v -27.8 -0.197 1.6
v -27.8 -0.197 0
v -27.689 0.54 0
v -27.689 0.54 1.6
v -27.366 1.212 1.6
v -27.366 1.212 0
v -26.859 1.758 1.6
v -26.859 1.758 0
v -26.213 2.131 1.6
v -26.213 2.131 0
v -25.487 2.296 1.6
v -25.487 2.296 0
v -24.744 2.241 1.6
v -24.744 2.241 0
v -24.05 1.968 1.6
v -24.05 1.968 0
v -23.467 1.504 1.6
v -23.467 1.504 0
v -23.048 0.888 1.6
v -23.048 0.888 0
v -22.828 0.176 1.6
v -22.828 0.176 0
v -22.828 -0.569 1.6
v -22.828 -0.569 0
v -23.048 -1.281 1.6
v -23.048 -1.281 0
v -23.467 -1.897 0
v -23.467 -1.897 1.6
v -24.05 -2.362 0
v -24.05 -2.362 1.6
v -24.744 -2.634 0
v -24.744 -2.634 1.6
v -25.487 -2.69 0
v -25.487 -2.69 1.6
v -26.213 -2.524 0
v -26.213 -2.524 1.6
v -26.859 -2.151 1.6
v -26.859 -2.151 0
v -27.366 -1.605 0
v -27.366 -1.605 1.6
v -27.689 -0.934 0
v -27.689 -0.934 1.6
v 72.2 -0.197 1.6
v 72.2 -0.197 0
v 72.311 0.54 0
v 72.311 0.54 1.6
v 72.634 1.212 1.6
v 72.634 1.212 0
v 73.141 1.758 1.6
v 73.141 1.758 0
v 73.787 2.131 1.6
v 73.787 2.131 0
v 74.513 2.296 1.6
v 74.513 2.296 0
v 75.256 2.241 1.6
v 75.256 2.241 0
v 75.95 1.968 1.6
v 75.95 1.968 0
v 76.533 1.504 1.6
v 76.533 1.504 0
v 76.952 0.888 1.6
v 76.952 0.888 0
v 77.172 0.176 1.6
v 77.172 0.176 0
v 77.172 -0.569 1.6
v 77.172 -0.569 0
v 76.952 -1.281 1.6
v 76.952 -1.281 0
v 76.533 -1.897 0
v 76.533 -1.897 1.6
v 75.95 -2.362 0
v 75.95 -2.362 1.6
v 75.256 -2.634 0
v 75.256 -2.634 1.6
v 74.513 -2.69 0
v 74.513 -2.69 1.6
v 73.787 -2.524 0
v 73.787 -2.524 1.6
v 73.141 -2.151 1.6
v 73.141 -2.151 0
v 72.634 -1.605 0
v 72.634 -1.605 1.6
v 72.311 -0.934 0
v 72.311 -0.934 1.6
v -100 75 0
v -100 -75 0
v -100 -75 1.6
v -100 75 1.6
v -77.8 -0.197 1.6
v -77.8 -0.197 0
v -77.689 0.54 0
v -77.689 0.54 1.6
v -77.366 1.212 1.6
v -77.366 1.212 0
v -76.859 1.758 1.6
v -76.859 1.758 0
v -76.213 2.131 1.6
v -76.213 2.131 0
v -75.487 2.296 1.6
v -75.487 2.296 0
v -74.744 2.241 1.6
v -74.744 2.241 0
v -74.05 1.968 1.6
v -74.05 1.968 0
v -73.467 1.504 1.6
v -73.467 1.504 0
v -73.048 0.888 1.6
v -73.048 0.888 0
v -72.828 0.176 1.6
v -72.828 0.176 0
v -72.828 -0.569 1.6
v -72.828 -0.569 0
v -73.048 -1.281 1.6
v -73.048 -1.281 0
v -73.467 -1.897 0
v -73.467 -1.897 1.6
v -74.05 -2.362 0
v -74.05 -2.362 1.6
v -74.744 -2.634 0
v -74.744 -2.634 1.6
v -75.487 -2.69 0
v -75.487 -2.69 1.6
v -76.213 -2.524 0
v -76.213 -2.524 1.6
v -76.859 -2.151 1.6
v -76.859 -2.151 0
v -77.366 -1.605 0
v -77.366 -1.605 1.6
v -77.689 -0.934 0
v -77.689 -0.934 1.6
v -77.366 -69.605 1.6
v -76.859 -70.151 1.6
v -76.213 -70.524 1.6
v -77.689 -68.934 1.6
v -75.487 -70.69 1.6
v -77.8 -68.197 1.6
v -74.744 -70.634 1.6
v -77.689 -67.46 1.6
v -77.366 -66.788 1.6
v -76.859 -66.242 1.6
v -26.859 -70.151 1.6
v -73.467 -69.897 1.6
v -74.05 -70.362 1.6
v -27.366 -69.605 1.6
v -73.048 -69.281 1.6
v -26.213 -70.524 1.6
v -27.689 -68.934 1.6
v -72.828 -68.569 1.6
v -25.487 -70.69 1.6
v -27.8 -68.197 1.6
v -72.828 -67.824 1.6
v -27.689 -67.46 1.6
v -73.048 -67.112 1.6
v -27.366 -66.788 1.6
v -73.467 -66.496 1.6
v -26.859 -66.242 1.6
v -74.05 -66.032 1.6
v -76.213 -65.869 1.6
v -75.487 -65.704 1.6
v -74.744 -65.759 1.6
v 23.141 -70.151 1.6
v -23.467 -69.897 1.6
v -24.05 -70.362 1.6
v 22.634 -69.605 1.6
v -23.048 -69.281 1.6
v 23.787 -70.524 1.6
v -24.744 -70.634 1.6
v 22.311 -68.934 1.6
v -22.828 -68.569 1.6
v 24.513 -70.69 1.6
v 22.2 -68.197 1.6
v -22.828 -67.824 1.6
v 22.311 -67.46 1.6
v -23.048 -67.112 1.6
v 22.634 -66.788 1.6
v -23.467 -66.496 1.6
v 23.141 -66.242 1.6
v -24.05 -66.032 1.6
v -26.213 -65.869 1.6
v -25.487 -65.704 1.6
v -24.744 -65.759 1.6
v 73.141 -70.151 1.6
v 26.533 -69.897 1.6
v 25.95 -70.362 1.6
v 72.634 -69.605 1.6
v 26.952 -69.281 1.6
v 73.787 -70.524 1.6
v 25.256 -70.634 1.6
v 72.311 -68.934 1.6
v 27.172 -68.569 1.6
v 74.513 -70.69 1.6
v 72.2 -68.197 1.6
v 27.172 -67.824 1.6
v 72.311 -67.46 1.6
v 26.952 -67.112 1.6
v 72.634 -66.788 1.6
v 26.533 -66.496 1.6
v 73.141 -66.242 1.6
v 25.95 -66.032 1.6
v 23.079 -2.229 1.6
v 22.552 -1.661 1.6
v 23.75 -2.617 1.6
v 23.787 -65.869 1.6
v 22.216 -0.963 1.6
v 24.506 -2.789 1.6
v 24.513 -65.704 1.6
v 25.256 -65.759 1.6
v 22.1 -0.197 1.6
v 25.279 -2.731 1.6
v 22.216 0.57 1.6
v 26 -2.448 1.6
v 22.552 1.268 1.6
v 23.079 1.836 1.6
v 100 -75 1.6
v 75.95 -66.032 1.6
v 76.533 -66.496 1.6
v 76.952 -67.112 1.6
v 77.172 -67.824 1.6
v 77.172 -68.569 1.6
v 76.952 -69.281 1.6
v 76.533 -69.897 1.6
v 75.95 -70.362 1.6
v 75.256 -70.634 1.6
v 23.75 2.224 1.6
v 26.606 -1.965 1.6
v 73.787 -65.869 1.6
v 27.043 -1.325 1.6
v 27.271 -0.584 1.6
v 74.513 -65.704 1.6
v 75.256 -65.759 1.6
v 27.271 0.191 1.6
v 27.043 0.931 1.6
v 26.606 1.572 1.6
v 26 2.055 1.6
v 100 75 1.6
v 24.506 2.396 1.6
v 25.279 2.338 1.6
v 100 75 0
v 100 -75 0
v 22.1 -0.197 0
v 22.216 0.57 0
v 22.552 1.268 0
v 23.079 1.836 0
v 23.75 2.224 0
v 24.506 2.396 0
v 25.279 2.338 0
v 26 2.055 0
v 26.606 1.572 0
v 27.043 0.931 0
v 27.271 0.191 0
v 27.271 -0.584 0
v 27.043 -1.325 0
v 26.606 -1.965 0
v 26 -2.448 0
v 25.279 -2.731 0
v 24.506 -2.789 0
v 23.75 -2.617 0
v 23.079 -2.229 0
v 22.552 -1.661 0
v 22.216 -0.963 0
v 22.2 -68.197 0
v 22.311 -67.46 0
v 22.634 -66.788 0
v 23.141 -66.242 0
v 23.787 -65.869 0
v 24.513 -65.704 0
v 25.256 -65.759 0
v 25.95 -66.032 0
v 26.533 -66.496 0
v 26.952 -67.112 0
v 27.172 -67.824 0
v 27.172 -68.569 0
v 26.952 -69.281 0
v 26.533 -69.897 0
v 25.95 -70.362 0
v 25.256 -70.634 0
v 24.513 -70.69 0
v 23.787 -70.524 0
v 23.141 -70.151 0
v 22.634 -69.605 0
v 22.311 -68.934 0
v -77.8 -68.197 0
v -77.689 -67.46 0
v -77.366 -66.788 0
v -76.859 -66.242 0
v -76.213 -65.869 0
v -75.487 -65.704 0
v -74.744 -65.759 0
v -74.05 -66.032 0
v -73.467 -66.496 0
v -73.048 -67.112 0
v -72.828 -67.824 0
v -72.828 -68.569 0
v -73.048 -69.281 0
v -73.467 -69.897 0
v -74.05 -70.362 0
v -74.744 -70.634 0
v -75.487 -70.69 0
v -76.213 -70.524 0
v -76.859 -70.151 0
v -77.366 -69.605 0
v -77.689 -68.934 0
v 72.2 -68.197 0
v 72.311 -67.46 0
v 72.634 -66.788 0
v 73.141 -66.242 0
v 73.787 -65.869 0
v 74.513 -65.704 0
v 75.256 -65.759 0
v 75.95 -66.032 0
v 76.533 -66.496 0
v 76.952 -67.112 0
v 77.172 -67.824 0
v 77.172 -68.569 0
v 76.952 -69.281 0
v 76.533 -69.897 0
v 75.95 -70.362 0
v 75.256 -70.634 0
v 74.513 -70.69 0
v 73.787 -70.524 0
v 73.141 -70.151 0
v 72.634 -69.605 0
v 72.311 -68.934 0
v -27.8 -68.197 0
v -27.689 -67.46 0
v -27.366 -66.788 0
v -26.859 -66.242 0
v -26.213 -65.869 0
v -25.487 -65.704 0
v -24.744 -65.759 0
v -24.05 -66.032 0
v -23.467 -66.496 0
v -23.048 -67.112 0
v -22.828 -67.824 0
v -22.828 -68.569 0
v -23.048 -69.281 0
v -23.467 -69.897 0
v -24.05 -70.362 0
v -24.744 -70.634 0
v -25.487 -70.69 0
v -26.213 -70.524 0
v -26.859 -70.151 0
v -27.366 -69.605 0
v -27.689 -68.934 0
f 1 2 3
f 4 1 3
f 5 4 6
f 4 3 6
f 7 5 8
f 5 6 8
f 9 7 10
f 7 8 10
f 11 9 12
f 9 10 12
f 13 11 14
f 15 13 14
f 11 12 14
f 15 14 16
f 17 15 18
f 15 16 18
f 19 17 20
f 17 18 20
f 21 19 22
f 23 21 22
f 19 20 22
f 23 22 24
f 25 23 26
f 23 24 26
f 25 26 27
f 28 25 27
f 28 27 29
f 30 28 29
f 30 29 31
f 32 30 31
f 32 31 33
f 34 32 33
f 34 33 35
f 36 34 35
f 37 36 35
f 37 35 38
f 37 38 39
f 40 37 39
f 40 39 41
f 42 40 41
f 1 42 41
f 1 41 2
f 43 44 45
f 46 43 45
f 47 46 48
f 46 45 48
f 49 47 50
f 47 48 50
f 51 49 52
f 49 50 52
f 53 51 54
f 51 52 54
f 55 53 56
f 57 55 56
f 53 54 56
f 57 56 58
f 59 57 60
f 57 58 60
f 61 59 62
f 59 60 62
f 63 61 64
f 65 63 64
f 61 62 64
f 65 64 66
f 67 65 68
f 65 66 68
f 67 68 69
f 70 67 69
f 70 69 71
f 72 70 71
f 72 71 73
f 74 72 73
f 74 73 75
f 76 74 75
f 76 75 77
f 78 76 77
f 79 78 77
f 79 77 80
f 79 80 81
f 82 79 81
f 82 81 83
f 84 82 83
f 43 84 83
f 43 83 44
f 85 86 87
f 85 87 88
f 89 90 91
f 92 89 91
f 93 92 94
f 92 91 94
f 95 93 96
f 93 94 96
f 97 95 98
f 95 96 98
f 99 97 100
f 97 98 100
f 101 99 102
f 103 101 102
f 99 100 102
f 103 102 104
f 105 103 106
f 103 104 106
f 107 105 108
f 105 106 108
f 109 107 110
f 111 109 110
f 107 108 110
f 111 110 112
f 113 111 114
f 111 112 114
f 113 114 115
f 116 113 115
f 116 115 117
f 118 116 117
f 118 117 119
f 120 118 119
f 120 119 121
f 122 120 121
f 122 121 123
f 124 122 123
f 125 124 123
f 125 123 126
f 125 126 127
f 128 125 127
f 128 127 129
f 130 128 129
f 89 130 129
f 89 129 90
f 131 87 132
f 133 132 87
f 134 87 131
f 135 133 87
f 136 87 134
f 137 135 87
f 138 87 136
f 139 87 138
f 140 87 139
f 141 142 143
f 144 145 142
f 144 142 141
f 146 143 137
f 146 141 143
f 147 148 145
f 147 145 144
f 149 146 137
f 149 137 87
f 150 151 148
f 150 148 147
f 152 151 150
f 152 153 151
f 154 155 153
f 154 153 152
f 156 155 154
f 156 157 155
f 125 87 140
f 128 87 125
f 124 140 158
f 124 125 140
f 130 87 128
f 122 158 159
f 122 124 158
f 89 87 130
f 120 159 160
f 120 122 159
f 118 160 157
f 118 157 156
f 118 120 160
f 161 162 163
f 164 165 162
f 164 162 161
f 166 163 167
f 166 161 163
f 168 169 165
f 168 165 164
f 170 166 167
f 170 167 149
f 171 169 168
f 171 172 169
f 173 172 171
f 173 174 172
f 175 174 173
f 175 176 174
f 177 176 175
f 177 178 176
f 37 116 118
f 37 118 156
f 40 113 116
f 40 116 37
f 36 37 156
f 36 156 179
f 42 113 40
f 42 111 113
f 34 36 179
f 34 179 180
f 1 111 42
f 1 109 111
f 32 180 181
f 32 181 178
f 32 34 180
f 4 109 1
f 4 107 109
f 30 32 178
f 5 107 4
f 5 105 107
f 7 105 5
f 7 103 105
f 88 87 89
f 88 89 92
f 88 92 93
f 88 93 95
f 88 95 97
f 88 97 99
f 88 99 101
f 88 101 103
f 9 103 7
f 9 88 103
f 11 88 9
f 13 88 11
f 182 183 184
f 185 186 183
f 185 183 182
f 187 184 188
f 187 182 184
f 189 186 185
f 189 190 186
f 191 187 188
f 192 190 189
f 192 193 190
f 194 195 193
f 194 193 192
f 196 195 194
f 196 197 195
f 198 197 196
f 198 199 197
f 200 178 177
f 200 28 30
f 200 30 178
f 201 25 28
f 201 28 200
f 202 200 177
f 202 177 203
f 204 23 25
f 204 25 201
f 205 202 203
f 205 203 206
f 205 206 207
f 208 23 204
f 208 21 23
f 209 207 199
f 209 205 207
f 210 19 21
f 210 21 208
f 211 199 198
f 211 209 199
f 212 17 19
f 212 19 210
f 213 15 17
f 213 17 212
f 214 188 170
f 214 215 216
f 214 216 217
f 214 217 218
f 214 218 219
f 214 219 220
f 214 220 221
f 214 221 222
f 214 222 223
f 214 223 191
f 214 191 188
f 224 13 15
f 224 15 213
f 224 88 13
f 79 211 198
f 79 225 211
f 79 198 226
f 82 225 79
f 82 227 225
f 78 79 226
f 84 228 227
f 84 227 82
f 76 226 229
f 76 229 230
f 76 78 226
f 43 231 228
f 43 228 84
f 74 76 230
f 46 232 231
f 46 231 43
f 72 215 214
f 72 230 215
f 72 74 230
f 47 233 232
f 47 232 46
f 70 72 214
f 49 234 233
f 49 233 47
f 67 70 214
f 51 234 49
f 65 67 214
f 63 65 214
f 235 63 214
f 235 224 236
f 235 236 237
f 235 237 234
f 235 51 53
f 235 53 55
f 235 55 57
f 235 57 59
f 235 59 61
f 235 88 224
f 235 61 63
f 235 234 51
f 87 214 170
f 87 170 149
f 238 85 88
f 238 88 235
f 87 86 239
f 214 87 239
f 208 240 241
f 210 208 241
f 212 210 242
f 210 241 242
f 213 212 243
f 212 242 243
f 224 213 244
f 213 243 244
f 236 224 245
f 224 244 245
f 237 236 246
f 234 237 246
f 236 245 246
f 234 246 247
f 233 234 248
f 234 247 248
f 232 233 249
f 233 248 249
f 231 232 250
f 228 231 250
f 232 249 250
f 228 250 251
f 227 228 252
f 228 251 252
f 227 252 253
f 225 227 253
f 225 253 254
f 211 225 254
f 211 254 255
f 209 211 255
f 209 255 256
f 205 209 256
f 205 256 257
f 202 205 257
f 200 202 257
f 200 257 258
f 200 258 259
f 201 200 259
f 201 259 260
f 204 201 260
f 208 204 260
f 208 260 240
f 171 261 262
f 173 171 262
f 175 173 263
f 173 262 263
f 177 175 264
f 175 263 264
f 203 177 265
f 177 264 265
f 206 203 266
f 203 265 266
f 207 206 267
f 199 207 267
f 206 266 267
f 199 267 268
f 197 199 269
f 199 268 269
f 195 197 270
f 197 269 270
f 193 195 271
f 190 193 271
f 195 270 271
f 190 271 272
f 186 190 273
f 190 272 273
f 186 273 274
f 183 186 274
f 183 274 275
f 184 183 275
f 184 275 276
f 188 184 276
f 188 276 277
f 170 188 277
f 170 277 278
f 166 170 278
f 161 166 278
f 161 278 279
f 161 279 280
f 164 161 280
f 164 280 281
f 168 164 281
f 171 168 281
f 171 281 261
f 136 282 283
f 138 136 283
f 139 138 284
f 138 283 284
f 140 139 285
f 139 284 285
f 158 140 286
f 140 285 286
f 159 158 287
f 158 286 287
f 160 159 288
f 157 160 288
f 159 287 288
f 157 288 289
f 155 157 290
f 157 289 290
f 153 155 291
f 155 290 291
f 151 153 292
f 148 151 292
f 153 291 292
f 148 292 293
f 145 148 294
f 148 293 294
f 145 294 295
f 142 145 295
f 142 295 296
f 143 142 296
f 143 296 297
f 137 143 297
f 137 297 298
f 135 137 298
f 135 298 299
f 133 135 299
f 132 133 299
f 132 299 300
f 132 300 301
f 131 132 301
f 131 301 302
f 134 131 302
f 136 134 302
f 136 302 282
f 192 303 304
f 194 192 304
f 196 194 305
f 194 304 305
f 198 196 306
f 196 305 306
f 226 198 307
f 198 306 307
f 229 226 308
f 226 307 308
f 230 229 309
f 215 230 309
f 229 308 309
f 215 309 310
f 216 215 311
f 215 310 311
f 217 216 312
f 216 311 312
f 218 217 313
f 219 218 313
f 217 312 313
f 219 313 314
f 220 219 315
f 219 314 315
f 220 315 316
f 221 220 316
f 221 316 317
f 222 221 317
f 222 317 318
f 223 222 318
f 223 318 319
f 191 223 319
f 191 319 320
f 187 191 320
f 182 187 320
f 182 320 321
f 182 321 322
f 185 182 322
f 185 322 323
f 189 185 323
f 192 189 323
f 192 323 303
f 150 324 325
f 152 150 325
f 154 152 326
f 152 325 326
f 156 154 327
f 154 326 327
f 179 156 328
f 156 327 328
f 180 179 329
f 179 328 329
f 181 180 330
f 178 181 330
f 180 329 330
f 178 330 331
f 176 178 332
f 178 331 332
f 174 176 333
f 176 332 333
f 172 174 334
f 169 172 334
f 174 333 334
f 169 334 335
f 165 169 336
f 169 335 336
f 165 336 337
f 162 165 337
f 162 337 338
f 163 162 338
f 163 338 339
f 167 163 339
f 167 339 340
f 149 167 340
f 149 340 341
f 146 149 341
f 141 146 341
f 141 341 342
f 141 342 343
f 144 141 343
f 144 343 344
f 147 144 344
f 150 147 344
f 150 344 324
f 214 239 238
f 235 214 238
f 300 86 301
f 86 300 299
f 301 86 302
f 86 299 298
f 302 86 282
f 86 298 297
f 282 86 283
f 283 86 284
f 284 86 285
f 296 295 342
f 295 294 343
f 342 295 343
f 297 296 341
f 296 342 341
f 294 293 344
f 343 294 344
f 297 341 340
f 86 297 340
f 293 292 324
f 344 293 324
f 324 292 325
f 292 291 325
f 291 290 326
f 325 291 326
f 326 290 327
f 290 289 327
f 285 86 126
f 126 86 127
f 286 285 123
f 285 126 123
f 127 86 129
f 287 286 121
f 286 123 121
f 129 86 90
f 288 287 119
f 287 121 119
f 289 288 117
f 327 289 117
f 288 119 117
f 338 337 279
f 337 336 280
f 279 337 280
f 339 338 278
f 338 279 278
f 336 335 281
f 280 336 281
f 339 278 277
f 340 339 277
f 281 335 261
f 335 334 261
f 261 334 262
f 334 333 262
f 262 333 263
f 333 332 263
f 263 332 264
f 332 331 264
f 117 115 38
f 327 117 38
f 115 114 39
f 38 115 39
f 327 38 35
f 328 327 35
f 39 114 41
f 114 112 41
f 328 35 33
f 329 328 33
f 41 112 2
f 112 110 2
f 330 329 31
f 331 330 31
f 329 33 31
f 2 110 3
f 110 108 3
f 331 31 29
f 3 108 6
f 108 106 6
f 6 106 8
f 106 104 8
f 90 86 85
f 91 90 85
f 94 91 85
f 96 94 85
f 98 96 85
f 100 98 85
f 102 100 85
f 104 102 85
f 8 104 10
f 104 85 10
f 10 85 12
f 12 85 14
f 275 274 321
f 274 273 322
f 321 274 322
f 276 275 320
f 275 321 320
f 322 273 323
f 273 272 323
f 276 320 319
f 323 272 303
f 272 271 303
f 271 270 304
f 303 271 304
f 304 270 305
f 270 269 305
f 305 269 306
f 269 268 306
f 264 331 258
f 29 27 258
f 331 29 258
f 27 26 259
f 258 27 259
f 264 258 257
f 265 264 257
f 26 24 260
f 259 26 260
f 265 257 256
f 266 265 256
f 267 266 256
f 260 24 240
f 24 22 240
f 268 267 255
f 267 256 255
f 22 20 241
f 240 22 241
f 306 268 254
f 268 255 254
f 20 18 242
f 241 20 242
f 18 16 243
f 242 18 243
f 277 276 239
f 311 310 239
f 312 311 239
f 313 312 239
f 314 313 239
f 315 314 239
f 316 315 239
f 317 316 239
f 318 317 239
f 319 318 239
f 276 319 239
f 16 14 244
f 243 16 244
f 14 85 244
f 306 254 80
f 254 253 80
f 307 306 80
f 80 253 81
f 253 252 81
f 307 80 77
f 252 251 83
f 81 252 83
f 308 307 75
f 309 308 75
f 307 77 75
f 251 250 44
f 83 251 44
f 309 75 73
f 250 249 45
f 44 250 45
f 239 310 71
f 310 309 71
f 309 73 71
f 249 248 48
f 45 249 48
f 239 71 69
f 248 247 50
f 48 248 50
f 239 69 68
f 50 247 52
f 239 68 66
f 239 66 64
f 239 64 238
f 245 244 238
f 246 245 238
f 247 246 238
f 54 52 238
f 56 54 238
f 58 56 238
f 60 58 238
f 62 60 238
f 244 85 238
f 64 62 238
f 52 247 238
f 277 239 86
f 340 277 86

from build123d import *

# Parameters (mm, degrees)
ESQUISSE1_W             = 200
ESQUISSE1_H             = 150
BOSS_EXTRU_1_DEPTH      = 1.6
ESQUISSE2_R             = 2.5
ESQUISSE2_R_2           = 2.6
ENL_V_MAT_EXTRU_1_DEPTH = 10


with BuildPart() as part:
    # Esquisse1 → Boss.-Extru.1 (new body)
    with BuildSketch(Plane.XY):
        Rectangle(ESQUISSE1_W, ESQUISSE1_H)
    extrude(amount=BOSS_EXTRU_1_DEPTH)

    # Esquisse2 → Enlèv. mat.-Extru.1 (cut)
    with BuildSketch(Plane(origin=(0, 0, 0), x_dir=(-1, 0, 0), z_dir=(0, 0, -1))):
        with Locations((75.3, -0.196647834)):
            Circle(ESQUISSE2_R)
        with Locations((25.3, -0.196647834)):
            Circle(ESQUISSE2_R)
        with Locations((-24.7, -0.196647834)):
            Circle(ESQUISSE2_R_2)
        with Locations((-74.7, -0.196647834)):
            Circle(ESQUISSE2_R)
        with Locations((75.3, -68.196647834)):
            Circle(ESQUISSE2_R)
        with Locations((25.3, -68.196647834)):
            Circle(ESQUISSE2_R)
        with Locations((-24.7, -68.196647834)):
            Circle(ESQUISSE2_R)
        with Locations((-74.7, -68.196647834)):
            Circle(ESQUISSE2_R)
    extrude(amount=-ENL_V_MAT_EXTRU_1_DEPTH, mode=Mode.SUBTRACT)


solid = part.part
